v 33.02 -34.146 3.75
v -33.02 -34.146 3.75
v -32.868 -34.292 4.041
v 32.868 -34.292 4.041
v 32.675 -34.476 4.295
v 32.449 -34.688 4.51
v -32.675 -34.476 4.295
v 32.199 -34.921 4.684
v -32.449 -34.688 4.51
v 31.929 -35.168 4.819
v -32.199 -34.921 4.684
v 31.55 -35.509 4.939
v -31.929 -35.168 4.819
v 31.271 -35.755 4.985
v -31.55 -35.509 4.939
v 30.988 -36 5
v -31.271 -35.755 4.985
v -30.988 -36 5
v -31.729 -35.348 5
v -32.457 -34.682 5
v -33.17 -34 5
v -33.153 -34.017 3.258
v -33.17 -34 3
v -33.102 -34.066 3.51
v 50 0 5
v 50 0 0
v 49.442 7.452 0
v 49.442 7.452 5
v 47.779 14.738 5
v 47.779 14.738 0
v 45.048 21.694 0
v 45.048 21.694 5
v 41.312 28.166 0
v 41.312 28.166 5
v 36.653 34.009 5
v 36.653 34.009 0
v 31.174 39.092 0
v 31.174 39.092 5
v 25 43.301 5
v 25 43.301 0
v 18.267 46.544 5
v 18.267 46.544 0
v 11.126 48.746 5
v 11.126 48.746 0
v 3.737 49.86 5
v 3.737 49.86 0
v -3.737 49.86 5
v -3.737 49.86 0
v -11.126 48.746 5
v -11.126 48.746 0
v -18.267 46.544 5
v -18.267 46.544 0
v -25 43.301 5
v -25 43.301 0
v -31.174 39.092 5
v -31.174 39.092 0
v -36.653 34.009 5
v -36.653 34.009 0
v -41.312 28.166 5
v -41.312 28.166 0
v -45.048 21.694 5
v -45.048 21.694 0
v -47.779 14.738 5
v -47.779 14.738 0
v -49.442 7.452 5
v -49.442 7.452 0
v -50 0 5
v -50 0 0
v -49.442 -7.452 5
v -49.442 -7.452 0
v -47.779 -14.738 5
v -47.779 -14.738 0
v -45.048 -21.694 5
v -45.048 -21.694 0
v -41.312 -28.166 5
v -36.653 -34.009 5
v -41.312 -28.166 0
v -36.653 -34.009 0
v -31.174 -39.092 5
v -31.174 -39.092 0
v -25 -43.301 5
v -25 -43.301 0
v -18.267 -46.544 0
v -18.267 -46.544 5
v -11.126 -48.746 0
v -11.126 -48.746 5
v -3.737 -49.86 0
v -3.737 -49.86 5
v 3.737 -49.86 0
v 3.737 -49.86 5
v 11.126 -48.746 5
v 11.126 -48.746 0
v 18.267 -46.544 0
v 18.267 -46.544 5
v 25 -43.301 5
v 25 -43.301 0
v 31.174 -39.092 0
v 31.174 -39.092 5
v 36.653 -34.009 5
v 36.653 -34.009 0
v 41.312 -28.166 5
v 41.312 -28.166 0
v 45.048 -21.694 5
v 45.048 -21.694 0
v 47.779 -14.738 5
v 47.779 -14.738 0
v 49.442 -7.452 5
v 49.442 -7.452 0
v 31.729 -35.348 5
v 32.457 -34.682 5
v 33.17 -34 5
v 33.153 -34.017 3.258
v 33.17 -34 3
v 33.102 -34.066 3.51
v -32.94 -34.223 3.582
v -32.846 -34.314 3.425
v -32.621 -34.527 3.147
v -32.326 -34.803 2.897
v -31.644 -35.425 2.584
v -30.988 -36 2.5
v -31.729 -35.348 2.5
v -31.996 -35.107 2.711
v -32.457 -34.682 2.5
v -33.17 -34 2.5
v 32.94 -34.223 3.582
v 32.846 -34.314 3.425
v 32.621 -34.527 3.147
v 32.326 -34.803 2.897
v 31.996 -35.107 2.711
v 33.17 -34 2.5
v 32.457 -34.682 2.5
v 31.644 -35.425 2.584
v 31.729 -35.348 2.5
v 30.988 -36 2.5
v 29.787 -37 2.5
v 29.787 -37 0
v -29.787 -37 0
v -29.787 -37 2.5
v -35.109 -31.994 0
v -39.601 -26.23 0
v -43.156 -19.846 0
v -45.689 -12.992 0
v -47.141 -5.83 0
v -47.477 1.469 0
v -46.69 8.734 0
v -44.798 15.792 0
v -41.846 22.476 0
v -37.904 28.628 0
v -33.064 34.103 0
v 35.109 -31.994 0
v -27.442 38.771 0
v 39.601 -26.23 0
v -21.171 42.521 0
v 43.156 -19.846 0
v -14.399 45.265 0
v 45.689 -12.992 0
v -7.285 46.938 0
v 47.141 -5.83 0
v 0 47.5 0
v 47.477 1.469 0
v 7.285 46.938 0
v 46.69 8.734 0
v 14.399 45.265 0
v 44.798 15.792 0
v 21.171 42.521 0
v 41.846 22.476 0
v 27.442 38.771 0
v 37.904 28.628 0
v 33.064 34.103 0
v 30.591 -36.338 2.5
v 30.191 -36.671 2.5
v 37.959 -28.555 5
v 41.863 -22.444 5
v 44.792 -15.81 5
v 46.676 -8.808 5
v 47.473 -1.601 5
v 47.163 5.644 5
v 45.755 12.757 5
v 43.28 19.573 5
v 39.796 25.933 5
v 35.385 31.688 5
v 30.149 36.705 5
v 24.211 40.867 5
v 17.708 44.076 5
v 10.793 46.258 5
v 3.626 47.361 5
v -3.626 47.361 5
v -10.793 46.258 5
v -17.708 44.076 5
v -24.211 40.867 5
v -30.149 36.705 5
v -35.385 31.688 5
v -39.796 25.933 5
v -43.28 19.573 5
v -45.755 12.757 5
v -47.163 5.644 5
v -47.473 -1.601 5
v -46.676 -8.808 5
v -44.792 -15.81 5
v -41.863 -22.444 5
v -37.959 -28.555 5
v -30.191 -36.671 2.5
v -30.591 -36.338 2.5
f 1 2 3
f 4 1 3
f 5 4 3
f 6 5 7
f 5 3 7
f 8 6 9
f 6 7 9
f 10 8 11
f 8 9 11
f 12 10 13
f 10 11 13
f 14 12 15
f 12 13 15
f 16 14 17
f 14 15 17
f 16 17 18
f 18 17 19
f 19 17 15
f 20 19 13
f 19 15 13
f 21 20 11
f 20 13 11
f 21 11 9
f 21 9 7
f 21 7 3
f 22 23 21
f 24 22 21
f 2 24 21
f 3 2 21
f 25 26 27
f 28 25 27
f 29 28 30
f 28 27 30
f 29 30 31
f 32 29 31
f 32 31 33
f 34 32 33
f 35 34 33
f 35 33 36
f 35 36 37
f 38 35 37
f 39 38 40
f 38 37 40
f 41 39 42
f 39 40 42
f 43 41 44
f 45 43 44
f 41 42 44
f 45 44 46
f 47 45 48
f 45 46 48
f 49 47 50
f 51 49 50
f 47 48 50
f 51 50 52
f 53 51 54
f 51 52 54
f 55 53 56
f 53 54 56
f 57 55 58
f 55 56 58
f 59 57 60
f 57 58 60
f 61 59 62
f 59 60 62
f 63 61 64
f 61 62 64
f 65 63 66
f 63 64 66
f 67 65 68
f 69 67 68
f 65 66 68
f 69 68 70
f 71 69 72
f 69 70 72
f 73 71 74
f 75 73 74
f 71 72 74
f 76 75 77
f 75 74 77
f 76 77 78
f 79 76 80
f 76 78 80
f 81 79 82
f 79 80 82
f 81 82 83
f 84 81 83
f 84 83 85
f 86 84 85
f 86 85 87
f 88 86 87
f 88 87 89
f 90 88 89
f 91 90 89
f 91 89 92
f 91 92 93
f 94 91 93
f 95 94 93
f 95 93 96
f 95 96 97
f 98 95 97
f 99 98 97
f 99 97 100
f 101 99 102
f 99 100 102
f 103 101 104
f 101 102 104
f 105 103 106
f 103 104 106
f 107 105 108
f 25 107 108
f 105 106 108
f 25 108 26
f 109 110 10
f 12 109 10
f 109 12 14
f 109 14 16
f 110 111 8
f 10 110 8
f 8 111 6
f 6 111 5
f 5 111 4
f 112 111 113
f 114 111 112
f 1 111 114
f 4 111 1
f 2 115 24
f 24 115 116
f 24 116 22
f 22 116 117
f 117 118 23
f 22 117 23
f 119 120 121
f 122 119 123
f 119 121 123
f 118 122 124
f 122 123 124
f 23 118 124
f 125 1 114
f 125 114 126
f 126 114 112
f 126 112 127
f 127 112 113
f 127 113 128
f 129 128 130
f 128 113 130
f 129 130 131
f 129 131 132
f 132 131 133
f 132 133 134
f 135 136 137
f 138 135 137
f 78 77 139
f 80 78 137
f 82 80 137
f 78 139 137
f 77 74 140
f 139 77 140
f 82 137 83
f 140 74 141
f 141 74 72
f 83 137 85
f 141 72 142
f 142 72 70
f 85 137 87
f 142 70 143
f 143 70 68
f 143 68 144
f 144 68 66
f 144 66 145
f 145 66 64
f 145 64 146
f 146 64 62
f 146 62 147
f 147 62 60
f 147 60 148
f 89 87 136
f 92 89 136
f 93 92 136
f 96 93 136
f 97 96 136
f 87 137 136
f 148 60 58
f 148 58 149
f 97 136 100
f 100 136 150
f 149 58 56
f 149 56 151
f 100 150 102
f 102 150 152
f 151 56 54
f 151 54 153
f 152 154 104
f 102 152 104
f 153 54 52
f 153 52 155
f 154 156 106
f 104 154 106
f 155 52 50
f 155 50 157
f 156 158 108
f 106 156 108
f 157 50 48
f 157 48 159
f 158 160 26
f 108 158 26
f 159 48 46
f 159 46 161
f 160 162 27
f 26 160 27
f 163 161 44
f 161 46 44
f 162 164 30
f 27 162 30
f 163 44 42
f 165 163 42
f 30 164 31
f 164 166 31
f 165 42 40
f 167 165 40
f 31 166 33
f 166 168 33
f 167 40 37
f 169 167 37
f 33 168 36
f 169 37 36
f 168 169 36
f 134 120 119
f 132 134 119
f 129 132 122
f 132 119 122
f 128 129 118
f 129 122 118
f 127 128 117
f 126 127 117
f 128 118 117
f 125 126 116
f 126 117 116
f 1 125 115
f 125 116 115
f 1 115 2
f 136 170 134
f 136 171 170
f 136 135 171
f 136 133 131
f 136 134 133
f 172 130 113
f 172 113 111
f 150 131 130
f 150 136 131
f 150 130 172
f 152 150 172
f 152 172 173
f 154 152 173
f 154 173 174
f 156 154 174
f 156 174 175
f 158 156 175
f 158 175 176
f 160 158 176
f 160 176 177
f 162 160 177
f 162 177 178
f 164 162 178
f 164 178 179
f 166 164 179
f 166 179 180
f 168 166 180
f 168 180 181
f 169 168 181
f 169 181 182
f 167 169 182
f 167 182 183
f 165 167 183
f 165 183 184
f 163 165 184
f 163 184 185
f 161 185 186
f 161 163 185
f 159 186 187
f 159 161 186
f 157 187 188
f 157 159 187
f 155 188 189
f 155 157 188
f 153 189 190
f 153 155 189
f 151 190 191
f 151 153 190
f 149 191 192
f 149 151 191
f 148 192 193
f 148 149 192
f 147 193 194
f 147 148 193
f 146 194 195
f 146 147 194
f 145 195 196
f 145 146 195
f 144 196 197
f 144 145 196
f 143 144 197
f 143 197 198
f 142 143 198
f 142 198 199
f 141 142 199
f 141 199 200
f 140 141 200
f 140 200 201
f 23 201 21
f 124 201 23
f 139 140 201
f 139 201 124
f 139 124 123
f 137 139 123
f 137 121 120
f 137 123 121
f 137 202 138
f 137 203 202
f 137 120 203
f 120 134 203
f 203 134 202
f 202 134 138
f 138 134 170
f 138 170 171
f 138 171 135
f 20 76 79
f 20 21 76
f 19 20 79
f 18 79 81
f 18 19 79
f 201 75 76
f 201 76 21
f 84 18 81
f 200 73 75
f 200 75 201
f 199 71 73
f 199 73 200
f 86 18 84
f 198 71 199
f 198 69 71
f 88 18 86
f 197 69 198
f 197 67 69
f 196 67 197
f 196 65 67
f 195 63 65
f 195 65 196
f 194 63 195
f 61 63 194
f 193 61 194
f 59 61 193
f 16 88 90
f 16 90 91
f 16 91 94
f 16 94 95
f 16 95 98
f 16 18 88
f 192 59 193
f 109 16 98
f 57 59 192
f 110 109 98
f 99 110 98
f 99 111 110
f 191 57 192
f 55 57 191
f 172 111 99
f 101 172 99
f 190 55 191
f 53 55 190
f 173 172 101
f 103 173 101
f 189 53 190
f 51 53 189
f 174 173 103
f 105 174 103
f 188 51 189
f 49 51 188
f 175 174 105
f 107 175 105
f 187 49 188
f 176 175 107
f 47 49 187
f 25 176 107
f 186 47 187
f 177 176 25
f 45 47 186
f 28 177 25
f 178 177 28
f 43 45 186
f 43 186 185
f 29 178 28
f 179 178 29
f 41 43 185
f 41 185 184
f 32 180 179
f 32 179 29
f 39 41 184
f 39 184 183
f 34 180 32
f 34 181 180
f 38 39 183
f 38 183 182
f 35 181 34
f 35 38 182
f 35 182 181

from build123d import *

# Parameters (mm, degrees)
ESQUISSE1_R        = 50
ESQUISSE1_R_2      = 47.5
BOSS_EXTRU_1_DEPTH = 5
BOSS_EXTRU_2_START = -2.5
BOSS_EXTRU_2_DEPTH = 2.5
CONG_2_R           = 2
BOSS_EXTRU_3_START = 2.5
BOSS_EXTRU_3_DEPTH = 2.5


with BuildPart() as part:
    # Esquisse1 → Boss.-Extru.1 (new body)
    with BuildSketch(Plane.XY):
        Circle(ESQUISSE1_R)
        Circle(ESQUISSE1_R_2, mode=Mode.SUBTRACT)
    extrude(amount=BOSS_EXTRU_1_DEPTH)

    # Esquisse2 → Boss.-Extru.2 (add)
    with BuildSketch(Plane.XY.offset(5).offset(BOSS_EXTRU_2_START)):
        with BuildLine():
            Line((-33.170016581, -34), (33.170016581, -34))
            ThreePointArc((33.170016581, -34), (0, -47.5), (-33.170016581, -34))
        make_face()
    extrude(amount=BOSS_EXTRU_2_DEPTH)

    # Congé2
    # the kernel refuses this fillet: 2 mm, written as the material it takes off along each edge
    with BuildSketch(Plane(origin=(-38.170016581, -34, 5), x_dir=(0, -1, 0), z_dir=(1, 0, 0))) as cong_2_piece_1_section:
        with BuildLine():
            CenterArc((CONG_2_R, CONG_2_R), CONG_2_R, 180, 90)
            Line((0, CONG_2_R), (0, 0))
            Line((0, 0), (CONG_2_R, 0))
        make_face()
    cong_2_piece_1 = extrude(amount=76.340033162, mode=Mode.PRIVATE)
    cong_2_piece_1 = cong_2_piece_1 & Plane(origin=(0, 0, 4.543639328), x_dir=(1, 0, 0), z_dir=(0, 0, -1)) * Cylinder(47.5, 161, mode=Mode.PRIVATE)
    add(cong_2_piece_1, mode=Mode.SUBTRACT)
    with BuildSketch(Plane(origin=(-38.170016581, -34, 2.5), x_dir=(0, 0, 1), z_dir=(1, 0, 0))) as cong_2_piece_2_section:
        with BuildLine():
            CenterArc((CONG_2_R, CONG_2_R), CONG_2_R, 180, 90)
            Line((0, CONG_2_R), (0, 0))
            Line((0, 0), (CONG_2_R, 0))
        make_face()
    cong_2_piece_2 = extrude(amount=76.340033162, mode=Mode.PRIVATE)
    cong_2_piece_2 = cong_2_piece_2 & Plane(origin=(0, 0, 2.956360666), x_dir=(1, 0, 0), z_dir=(0, 0, -1)) * Cylinder(47.5, 161, mode=Mode.PRIVATE)
    add(cong_2_piece_2, mode=Mode.SUBTRACT)

    # Esquisse3 → Boss.-Extru.3 (add)
    with BuildSketch(Plane(origin=(0, 0, 2.5), x_dir=(-1, 0, 0), z_dir=(0, 0, -1)).offset(BOSS_EXTRU_3_START)):
        with BuildLine():
            Line((-29.786742017, -37), (29.786742017, -37))
            ThreePointArc((29.786742017, -37), (0, -47.5), (-29.786742017, -37))
        make_face()
    extrude(amount=-BOSS_EXTRU_3_DEPTH)


solid = part.part
